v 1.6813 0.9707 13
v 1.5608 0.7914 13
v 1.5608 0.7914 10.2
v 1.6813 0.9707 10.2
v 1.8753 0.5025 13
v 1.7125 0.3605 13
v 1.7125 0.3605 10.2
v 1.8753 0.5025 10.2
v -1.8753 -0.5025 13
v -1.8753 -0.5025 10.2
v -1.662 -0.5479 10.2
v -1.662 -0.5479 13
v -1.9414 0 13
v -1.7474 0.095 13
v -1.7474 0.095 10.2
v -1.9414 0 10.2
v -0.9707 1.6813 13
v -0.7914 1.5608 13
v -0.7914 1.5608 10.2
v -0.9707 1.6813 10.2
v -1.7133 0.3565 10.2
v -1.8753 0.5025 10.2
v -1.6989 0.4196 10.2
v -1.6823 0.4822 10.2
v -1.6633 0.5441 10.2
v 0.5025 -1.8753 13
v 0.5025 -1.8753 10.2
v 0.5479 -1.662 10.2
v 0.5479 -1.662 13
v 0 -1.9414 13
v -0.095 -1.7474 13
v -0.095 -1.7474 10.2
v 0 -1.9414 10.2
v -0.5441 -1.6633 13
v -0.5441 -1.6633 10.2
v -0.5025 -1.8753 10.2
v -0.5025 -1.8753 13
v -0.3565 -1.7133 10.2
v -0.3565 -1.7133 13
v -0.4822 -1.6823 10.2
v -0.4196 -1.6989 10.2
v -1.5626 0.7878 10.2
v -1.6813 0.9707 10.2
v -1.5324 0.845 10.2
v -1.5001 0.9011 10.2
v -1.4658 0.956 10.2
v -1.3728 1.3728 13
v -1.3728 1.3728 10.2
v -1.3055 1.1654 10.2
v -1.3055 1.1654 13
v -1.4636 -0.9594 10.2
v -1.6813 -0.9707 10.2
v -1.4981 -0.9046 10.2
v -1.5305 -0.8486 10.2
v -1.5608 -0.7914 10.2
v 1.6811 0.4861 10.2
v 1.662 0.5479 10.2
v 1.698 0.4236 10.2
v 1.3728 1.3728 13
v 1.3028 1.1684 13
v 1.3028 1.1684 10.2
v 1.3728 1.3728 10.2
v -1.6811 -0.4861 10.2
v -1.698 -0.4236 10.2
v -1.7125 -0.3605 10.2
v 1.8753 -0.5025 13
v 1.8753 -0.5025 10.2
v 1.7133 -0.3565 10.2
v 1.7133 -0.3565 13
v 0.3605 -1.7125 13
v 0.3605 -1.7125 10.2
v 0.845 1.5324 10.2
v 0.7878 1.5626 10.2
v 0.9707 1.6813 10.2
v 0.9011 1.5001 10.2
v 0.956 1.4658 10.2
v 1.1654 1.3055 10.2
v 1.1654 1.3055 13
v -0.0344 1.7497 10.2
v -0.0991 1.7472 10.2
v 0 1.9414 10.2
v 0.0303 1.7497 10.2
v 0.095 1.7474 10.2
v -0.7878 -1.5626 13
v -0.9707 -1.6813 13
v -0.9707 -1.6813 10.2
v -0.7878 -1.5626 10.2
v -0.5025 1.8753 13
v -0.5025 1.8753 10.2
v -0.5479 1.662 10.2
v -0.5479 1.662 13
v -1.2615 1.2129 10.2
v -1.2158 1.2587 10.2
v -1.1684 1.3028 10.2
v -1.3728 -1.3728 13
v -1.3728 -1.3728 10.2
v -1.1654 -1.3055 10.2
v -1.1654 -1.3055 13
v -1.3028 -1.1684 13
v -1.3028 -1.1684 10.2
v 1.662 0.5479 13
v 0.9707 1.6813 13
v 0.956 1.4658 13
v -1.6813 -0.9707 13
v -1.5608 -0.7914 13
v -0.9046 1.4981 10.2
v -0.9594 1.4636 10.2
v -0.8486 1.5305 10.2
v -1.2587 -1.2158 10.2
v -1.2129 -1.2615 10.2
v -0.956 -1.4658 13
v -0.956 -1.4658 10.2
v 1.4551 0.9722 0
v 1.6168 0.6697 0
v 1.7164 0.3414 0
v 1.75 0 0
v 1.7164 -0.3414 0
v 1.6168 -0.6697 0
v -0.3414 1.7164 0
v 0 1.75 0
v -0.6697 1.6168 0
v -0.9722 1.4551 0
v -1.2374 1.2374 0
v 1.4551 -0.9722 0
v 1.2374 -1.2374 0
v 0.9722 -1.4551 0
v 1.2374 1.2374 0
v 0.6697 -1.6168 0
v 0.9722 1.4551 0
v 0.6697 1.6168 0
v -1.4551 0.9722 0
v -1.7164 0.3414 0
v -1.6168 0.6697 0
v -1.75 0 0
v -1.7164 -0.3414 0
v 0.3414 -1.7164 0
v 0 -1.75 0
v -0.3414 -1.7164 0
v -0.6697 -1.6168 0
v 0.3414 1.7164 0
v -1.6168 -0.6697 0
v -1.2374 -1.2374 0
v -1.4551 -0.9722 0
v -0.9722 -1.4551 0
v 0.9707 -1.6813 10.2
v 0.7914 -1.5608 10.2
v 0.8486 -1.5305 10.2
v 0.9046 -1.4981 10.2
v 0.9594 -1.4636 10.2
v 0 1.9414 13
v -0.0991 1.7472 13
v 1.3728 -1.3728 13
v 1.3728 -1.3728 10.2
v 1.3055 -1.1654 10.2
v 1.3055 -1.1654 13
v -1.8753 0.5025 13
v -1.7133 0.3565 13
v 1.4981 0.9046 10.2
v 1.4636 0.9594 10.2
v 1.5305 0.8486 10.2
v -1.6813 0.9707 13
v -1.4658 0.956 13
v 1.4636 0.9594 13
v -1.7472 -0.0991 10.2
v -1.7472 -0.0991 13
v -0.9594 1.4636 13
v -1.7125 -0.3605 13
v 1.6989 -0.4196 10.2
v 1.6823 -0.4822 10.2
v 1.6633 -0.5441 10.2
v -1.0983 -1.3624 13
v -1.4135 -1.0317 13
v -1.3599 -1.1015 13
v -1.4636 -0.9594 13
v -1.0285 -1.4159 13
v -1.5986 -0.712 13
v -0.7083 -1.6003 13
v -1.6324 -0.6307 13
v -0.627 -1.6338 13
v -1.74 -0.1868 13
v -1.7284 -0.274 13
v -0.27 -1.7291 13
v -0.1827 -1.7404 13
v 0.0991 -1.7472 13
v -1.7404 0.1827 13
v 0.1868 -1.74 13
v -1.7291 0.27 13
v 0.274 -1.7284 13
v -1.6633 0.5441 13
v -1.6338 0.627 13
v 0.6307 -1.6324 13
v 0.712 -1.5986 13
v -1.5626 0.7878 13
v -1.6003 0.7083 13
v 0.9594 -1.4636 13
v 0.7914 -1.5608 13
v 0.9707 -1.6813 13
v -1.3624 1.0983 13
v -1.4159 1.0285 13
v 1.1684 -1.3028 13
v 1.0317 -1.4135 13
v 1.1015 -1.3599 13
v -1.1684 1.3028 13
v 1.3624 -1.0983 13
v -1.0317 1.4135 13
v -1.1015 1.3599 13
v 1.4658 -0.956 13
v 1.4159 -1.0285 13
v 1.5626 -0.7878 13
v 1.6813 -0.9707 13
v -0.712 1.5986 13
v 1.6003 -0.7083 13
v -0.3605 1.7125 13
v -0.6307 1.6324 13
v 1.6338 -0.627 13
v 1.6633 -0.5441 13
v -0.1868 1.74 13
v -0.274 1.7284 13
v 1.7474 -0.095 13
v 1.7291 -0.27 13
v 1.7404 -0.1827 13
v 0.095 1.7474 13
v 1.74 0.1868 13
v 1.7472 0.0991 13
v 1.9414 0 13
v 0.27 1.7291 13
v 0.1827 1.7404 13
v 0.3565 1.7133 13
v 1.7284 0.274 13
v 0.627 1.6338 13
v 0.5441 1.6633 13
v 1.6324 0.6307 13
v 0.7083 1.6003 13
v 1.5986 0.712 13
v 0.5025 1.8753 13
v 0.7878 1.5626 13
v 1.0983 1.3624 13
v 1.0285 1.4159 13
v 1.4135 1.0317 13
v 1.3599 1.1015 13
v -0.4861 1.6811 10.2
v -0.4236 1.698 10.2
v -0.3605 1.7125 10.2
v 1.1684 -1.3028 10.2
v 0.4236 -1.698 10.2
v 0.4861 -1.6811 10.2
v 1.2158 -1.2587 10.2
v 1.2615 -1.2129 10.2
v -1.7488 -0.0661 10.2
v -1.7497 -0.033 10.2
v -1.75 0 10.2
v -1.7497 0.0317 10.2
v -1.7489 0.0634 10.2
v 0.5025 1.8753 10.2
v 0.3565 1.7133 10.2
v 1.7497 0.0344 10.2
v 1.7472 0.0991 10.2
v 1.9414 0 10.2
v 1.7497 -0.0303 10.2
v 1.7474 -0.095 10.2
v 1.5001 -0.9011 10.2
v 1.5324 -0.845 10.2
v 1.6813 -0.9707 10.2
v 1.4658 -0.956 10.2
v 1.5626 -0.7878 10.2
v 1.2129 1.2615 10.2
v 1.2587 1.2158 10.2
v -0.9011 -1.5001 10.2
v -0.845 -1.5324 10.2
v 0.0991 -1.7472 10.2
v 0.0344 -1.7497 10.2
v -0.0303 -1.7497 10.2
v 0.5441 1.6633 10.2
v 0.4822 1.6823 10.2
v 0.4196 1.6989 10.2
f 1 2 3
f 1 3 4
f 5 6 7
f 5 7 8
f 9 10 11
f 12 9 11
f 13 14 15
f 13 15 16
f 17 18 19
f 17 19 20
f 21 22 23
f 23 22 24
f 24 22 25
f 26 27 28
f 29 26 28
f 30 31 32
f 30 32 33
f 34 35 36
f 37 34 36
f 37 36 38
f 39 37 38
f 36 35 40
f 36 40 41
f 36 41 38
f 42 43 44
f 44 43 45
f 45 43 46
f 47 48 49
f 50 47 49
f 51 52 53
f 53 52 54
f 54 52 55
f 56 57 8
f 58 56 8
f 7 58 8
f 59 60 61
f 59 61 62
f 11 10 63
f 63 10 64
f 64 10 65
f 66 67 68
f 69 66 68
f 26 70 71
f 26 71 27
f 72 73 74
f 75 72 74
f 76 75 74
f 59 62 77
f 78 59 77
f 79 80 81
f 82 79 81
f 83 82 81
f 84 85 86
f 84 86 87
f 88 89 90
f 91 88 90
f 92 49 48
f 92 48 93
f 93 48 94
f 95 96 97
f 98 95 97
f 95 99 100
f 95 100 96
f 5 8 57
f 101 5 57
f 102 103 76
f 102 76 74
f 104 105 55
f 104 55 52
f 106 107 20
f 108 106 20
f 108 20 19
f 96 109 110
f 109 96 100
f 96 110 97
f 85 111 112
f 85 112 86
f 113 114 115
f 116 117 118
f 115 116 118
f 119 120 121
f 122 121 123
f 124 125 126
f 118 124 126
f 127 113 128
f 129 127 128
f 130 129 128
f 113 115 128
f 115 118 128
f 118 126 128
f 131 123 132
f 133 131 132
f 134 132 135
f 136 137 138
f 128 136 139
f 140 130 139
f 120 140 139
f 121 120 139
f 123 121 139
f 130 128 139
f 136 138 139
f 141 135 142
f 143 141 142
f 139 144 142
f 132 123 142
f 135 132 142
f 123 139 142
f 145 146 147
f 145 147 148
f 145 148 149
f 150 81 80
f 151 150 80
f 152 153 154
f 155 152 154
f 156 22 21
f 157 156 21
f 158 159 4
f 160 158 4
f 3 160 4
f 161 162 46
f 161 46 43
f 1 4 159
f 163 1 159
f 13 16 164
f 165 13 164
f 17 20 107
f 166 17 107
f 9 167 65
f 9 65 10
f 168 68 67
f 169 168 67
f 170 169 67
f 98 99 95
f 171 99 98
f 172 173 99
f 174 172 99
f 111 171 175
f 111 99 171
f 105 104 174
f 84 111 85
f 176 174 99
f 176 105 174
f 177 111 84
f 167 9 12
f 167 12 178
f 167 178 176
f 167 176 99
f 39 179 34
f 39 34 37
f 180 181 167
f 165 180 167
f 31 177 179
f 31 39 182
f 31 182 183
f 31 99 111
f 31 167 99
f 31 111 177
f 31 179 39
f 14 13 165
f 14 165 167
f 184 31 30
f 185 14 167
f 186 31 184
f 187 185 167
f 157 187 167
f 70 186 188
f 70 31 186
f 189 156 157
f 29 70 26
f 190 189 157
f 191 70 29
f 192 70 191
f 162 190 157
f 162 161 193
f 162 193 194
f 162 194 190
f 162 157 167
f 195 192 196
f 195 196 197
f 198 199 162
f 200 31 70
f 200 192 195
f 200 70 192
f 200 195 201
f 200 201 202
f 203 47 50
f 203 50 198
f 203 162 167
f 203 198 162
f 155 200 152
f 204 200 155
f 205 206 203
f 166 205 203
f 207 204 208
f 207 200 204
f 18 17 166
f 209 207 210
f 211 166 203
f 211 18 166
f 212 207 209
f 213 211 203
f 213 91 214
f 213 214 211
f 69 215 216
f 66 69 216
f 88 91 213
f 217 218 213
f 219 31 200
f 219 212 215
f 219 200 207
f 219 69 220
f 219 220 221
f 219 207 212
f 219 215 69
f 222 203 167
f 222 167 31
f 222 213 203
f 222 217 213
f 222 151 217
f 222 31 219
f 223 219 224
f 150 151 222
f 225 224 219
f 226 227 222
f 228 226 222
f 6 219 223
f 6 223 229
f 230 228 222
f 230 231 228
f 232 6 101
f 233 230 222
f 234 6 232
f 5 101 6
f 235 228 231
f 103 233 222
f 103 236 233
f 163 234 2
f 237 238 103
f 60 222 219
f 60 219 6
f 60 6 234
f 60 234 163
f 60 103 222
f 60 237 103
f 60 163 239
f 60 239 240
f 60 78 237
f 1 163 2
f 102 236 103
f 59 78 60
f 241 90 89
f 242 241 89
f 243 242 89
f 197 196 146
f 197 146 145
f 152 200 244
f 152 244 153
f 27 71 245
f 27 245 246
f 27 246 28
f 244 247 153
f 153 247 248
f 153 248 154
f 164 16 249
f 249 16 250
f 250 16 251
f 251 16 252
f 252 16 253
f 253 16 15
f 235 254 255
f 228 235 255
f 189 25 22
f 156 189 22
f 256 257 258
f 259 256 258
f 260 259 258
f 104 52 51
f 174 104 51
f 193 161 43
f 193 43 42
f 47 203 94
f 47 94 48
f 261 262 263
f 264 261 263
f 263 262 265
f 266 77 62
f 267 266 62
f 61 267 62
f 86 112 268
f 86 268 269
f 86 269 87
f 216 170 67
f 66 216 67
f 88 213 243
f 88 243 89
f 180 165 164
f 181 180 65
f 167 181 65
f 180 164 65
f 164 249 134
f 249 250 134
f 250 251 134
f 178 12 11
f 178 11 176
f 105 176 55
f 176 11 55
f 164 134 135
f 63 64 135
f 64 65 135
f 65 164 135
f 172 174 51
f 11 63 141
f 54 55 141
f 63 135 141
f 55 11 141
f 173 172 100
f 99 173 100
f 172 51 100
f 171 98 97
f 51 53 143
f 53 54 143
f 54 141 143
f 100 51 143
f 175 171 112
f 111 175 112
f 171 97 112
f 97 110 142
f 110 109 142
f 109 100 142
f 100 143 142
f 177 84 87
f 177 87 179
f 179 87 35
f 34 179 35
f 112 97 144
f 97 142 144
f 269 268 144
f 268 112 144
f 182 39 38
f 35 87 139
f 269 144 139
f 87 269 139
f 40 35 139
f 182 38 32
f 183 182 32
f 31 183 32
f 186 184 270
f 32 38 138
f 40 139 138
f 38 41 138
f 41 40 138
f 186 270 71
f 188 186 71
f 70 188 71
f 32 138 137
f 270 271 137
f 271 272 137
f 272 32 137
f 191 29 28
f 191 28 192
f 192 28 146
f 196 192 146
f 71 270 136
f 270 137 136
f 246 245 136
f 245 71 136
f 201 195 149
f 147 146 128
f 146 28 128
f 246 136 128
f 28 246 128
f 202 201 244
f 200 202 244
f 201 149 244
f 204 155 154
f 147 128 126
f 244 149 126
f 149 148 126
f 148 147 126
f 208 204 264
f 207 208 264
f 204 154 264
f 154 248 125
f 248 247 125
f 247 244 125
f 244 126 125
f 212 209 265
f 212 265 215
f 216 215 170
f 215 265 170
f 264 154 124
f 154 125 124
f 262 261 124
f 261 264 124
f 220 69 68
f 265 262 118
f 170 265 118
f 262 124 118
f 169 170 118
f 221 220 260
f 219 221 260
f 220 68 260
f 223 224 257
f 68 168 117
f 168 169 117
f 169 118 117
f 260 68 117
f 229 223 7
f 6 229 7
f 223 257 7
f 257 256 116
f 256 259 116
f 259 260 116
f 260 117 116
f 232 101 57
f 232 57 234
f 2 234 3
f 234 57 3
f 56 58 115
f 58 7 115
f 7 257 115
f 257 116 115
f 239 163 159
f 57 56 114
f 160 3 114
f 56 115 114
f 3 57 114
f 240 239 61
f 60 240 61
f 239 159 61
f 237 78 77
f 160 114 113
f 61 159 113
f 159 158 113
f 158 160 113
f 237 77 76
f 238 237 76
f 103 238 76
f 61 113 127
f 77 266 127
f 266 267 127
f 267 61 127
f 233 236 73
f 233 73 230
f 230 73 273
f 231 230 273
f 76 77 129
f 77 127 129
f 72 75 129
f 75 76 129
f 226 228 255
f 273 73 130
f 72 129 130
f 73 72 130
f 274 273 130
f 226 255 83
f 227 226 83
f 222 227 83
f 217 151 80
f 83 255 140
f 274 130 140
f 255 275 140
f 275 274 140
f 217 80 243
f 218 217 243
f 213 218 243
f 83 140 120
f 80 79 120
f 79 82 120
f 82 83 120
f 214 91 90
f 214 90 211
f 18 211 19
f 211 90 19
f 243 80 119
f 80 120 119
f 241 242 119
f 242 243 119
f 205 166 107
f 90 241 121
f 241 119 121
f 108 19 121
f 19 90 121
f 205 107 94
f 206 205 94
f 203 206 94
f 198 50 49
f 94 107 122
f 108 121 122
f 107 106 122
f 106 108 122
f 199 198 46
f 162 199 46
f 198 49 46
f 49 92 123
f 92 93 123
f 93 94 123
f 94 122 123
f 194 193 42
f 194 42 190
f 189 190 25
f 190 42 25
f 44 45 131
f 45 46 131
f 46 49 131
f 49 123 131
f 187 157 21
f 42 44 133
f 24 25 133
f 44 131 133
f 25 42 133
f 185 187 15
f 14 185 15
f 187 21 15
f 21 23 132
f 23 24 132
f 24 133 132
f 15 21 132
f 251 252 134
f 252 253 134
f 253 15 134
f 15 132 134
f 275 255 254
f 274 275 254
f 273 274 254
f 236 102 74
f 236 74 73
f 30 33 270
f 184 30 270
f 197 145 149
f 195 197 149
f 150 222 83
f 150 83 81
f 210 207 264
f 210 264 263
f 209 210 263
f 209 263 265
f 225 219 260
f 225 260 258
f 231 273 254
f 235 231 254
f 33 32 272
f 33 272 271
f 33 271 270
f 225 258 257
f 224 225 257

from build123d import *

# Parameters (mm, degrees)
SKETCH1_R           = 1.75
BOSS_EXTRUDE1_DEPTH = 13
BOSS_EXTRUDE2_START = -2.8
BOSS_EXTRUDE2_DEPTH = 2.8
CIRPATTERN1_START   = 10.2
CIRPATTERN1_DEPTH   = 2.8


# Read off the part's stored shape, not the designer's step: CirPattern1
with BuildPart() as part:
    # Sketch1 → Boss-Extrude1 (new body)
    with BuildSketch(Plane.XY):
        with Locations(Location((0, 0, 0), (0, 0, 180))):
            Circle(SKETCH1_R)
    extrude(amount=BOSS_EXTRUDE1_DEPTH)

    # Sketch2 → Boss-Extrude2 (add)
    with BuildSketch(Plane.XY.offset(13).offset(BOSS_EXTRUDE2_START)):
        with BuildLine():
            Line((0.095027487, 1.747418031), (0, 1.941449497))
            Line((0, 1.941449497), (-0.099072162, 1.74719338))
            ThreePointArc((-0.099072162, 1.74719338), (-0.002025455, 1.749998828), (0.095027487, 1.747418031))
        make_face()
    extrude(amount=BOSS_EXTRUDE2_DEPTH)

    # CirPattern1 outline → CirPattern1 (add)
    with BuildSketch(Plane.XY.offset(CIRPATTERN1_START)):
        with BuildLine():
            Line((-0.360475563, 1.712471129), (-0.502484105, 1.87529621))
            Line((-0.502484105, 1.87529621), (-0.547903282, 1.662017447))
            ThreePointArc((-0.547903282, 1.662017447), (-0.454889465, 1.689844838), (-0.360475563, 1.712471129))
        make_face()
        with BuildLine():
            Line((0.502484105, 1.87529621), (0.356510562, 1.713300972))
            ThreePointArc((0.356510562, 1.713300972), (0.450976586, 1.69089329), (0.54405457, 1.663281283))
            Line((0.54405457, 1.663281283), (0.502484105, 1.87529621))
        make_face()
        with BuildLine():
            ThreePointArc((-0.959395699, 1.463577771), (-0.876753509, 1.514530714), (-0.791412798, 1.56082215))
            Line((-0.791412798, 1.56082215), (-0.970724749, 1.681344585))
            Line((-0.970724749, 1.681344585), (-0.959395699, 1.463577771))
        make_face()
        with BuildLine():
            Line((0.970724749, 1.681344585), (0.787797681, 1.562649933))
            ThreePointArc((0.787797681, 1.562649933), (0.873245319, 1.516556169), (0.956005233, 1.465794663))
            Line((0.956005233, 1.465794663), (0.970724749, 1.681344585))
        make_face()
        with BuildLine():
            ThreePointArc((-1.305506884, 1.165397689), (-1.238868251, 1.236003826), (-1.168416559, 1.30280572))
            Line((-1.168416559, 1.30280572), (-1.372812105, 1.372812105))
            Line((-1.372812105, 1.372812105), (-1.305506884, 1.165397689))
        make_face()
        with BuildLine():
            Line((1.372812105, 1.372812105), (1.165397689, 1.305506884))
            ThreePointArc((1.165397689, 1.305506884), (1.236003826, 1.238868251), (1.30280572, 1.168416559))
            Line((1.30280572, 1.168416559), (1.372812105, 1.372812105))
        make_face()
        with BuildLine():
            ThreePointArc((-1.562649933, 0.787797681), (-1.516556169, 0.873245319), (-1.465794663, 0.956005233))
            Line((-1.465794663, 0.956005233), (-1.681344585, 0.970724749))
            Line((-1.681344585, 0.970724749), (-1.562649933, 0.787797681))
        make_face()
        with BuildLine():
            Line((1.681344585, 0.970724749), (1.463577771, 0.959395699))
            ThreePointArc((1.463577771, 0.959395699), (1.514530714, 0.876753509), (1.56082215, 0.791412798))
            Line((1.56082215, 0.791412798), (1.681344585, 0.970724749))
        make_face()
        with BuildLine():
            ThreePointArc((-1.713300972, 0.356510562), (-1.69089329, 0.450976586), (-1.663281283, 0.54405457))
            Line((-1.663281283, 0.54405457), (-1.87529621, 0.502484105))
            Line((-1.87529621, 0.502484105), (-1.713300972, 0.356510562))
        make_face()
        with BuildLine():
            Line((1.87529621, 0.502484105), (1.662017447, 0.547903282))
            ThreePointArc((1.662017447, 0.547903282), (1.689844838, 0.454889465), (1.712471129, 0.360475563))
            Line((1.712471129, 0.360475563), (1.87529621, 0.502484105))
        make_face()
        with BuildLine():
            ThreePointArc((-1.74719338, -0.099072162), (-1.749998828, -0.002025455), (-1.747418031, 0.095027487))
            Line((-1.747418031, 0.095027487), (-1.941449497, 0))
            Line((-1.941449497, 0), (-1.74719338, -0.099072162))
        make_face()
        with BuildLine():
            Line((1.941449497, 0), (1.74719338, 0.099072162))
            ThreePointArc((1.74719338, 0.099072162), (1.749998828, 0.002025455), (1.747418031, -0.095027487))
            Line((1.747418031, -0.095027487), (1.941449497, 0))
        make_face()
        with BuildLine():
            ThreePointArc((-1.662017447, -0.547903282), (-1.689844838, -0.454889465), (-1.712471129, -0.360475563))
            Line((-1.712471129, -0.360475563), (-1.87529621, -0.502484105))
            Line((-1.87529621, -0.502484105), (-1.662017447, -0.547903282))
        make_face()
        with BuildLine():
            ThreePointArc((-1.463577771, -0.959395699), (-1.514530714, -0.876753509), (-1.56082215, -0.791412798))
            Line((-1.56082215, -0.791412798), (-1.681344585, -0.970724749))
            Line((-1.681344585, -0.970724749), (-1.463577771, -0.959395699))
        make_face()
        with BuildLine():
            Line((1.87529621, -0.502484105), (1.713300972, -0.356510562))
            ThreePointArc((1.713300972, -0.356510562), (1.69089329, -0.450976586), (1.663281283, -0.54405457))
            Line((1.663281283, -0.54405457), (1.87529621, -0.502484105))
        make_face()
        with BuildLine():
            ThreePointArc((-1.165397689, -1.305506884), (-1.236003826, -1.238868251), (-1.30280572, -1.168416559))
            Line((-1.30280572, -1.168416559), (-1.372812105, -1.372812105))
            Line((-1.372812105, -1.372812105), (-1.165397689, -1.305506884))
        make_face()
        with BuildLine():
            Line((1.681344585, -0.970724749), (1.562649933, -0.787797681))
            ThreePointArc((1.562649933, -0.787797681), (1.516556169, -0.873245319), (1.465794663, -0.956005233))
            Line((1.465794663, -0.956005233), (1.681344585, -0.970724749))
        make_face()
        with BuildLine():
            ThreePointArc((-0.787797681, -1.562649933), (-0.873245319, -1.516556169), (-0.956005233, -1.465794663))
            Line((-0.956005233, -1.465794663), (-0.970724749, -1.681344585))
            Line((-0.970724749, -1.681344585), (-0.787797681, -1.562649933))
        make_face()
        with BuildLine():
            Line((1.372812105, -1.372812105), (1.305506884, -1.165397689))
            ThreePointArc((1.305506884, -1.165397689), (1.238868251, -1.236003826), (1.168416559, -1.30280572))
            Line((1.168416559, -1.30280572), (1.372812105, -1.372812105))
        make_face()
        with BuildLine():
            ThreePointArc((-0.356510562, -1.713300972), (-0.450976586, -1.69089329), (-0.54405457, -1.663281283))
            Line((-0.54405457, -1.663281283), (-0.502484105, -1.87529621))
            Line((-0.502484105, -1.87529621), (-0.356510562, -1.713300972))
        make_face()
        with BuildLine():
            Line((0.970724749, -1.681344585), (0.959395699, -1.463577771))
            ThreePointArc((0.959395699, -1.463577771), (0.876753509, -1.514530714), (0.791412798, -1.56082215))
            Line((0.791412798, -1.56082215), (0.970724749, -1.681344585))
        make_face()
        with BuildLine():
            ThreePointArc((0.099072162, -1.74719338), (0.002025455, -1.749998828), (-0.095027487, -1.747418031))
            Line((-0.095027487, -1.747418031), (0, -1.941449497))
            Line((0, -1.941449497), (0.099072162, -1.74719338))
        make_face()
        with BuildLine():
            Line((0.502484105, -1.87529621), (0.547903282, -1.662017447))
            ThreePointArc((0.547903282, -1.662017447), (0.454889465, -1.689844838), (0.360475563, -1.712471129))
            Line((0.360475563, -1.712471129), (0.502484105, -1.87529621))
        make_face()
    extrude(amount=CIRPATTERN1_DEPTH)


solid = part.part
